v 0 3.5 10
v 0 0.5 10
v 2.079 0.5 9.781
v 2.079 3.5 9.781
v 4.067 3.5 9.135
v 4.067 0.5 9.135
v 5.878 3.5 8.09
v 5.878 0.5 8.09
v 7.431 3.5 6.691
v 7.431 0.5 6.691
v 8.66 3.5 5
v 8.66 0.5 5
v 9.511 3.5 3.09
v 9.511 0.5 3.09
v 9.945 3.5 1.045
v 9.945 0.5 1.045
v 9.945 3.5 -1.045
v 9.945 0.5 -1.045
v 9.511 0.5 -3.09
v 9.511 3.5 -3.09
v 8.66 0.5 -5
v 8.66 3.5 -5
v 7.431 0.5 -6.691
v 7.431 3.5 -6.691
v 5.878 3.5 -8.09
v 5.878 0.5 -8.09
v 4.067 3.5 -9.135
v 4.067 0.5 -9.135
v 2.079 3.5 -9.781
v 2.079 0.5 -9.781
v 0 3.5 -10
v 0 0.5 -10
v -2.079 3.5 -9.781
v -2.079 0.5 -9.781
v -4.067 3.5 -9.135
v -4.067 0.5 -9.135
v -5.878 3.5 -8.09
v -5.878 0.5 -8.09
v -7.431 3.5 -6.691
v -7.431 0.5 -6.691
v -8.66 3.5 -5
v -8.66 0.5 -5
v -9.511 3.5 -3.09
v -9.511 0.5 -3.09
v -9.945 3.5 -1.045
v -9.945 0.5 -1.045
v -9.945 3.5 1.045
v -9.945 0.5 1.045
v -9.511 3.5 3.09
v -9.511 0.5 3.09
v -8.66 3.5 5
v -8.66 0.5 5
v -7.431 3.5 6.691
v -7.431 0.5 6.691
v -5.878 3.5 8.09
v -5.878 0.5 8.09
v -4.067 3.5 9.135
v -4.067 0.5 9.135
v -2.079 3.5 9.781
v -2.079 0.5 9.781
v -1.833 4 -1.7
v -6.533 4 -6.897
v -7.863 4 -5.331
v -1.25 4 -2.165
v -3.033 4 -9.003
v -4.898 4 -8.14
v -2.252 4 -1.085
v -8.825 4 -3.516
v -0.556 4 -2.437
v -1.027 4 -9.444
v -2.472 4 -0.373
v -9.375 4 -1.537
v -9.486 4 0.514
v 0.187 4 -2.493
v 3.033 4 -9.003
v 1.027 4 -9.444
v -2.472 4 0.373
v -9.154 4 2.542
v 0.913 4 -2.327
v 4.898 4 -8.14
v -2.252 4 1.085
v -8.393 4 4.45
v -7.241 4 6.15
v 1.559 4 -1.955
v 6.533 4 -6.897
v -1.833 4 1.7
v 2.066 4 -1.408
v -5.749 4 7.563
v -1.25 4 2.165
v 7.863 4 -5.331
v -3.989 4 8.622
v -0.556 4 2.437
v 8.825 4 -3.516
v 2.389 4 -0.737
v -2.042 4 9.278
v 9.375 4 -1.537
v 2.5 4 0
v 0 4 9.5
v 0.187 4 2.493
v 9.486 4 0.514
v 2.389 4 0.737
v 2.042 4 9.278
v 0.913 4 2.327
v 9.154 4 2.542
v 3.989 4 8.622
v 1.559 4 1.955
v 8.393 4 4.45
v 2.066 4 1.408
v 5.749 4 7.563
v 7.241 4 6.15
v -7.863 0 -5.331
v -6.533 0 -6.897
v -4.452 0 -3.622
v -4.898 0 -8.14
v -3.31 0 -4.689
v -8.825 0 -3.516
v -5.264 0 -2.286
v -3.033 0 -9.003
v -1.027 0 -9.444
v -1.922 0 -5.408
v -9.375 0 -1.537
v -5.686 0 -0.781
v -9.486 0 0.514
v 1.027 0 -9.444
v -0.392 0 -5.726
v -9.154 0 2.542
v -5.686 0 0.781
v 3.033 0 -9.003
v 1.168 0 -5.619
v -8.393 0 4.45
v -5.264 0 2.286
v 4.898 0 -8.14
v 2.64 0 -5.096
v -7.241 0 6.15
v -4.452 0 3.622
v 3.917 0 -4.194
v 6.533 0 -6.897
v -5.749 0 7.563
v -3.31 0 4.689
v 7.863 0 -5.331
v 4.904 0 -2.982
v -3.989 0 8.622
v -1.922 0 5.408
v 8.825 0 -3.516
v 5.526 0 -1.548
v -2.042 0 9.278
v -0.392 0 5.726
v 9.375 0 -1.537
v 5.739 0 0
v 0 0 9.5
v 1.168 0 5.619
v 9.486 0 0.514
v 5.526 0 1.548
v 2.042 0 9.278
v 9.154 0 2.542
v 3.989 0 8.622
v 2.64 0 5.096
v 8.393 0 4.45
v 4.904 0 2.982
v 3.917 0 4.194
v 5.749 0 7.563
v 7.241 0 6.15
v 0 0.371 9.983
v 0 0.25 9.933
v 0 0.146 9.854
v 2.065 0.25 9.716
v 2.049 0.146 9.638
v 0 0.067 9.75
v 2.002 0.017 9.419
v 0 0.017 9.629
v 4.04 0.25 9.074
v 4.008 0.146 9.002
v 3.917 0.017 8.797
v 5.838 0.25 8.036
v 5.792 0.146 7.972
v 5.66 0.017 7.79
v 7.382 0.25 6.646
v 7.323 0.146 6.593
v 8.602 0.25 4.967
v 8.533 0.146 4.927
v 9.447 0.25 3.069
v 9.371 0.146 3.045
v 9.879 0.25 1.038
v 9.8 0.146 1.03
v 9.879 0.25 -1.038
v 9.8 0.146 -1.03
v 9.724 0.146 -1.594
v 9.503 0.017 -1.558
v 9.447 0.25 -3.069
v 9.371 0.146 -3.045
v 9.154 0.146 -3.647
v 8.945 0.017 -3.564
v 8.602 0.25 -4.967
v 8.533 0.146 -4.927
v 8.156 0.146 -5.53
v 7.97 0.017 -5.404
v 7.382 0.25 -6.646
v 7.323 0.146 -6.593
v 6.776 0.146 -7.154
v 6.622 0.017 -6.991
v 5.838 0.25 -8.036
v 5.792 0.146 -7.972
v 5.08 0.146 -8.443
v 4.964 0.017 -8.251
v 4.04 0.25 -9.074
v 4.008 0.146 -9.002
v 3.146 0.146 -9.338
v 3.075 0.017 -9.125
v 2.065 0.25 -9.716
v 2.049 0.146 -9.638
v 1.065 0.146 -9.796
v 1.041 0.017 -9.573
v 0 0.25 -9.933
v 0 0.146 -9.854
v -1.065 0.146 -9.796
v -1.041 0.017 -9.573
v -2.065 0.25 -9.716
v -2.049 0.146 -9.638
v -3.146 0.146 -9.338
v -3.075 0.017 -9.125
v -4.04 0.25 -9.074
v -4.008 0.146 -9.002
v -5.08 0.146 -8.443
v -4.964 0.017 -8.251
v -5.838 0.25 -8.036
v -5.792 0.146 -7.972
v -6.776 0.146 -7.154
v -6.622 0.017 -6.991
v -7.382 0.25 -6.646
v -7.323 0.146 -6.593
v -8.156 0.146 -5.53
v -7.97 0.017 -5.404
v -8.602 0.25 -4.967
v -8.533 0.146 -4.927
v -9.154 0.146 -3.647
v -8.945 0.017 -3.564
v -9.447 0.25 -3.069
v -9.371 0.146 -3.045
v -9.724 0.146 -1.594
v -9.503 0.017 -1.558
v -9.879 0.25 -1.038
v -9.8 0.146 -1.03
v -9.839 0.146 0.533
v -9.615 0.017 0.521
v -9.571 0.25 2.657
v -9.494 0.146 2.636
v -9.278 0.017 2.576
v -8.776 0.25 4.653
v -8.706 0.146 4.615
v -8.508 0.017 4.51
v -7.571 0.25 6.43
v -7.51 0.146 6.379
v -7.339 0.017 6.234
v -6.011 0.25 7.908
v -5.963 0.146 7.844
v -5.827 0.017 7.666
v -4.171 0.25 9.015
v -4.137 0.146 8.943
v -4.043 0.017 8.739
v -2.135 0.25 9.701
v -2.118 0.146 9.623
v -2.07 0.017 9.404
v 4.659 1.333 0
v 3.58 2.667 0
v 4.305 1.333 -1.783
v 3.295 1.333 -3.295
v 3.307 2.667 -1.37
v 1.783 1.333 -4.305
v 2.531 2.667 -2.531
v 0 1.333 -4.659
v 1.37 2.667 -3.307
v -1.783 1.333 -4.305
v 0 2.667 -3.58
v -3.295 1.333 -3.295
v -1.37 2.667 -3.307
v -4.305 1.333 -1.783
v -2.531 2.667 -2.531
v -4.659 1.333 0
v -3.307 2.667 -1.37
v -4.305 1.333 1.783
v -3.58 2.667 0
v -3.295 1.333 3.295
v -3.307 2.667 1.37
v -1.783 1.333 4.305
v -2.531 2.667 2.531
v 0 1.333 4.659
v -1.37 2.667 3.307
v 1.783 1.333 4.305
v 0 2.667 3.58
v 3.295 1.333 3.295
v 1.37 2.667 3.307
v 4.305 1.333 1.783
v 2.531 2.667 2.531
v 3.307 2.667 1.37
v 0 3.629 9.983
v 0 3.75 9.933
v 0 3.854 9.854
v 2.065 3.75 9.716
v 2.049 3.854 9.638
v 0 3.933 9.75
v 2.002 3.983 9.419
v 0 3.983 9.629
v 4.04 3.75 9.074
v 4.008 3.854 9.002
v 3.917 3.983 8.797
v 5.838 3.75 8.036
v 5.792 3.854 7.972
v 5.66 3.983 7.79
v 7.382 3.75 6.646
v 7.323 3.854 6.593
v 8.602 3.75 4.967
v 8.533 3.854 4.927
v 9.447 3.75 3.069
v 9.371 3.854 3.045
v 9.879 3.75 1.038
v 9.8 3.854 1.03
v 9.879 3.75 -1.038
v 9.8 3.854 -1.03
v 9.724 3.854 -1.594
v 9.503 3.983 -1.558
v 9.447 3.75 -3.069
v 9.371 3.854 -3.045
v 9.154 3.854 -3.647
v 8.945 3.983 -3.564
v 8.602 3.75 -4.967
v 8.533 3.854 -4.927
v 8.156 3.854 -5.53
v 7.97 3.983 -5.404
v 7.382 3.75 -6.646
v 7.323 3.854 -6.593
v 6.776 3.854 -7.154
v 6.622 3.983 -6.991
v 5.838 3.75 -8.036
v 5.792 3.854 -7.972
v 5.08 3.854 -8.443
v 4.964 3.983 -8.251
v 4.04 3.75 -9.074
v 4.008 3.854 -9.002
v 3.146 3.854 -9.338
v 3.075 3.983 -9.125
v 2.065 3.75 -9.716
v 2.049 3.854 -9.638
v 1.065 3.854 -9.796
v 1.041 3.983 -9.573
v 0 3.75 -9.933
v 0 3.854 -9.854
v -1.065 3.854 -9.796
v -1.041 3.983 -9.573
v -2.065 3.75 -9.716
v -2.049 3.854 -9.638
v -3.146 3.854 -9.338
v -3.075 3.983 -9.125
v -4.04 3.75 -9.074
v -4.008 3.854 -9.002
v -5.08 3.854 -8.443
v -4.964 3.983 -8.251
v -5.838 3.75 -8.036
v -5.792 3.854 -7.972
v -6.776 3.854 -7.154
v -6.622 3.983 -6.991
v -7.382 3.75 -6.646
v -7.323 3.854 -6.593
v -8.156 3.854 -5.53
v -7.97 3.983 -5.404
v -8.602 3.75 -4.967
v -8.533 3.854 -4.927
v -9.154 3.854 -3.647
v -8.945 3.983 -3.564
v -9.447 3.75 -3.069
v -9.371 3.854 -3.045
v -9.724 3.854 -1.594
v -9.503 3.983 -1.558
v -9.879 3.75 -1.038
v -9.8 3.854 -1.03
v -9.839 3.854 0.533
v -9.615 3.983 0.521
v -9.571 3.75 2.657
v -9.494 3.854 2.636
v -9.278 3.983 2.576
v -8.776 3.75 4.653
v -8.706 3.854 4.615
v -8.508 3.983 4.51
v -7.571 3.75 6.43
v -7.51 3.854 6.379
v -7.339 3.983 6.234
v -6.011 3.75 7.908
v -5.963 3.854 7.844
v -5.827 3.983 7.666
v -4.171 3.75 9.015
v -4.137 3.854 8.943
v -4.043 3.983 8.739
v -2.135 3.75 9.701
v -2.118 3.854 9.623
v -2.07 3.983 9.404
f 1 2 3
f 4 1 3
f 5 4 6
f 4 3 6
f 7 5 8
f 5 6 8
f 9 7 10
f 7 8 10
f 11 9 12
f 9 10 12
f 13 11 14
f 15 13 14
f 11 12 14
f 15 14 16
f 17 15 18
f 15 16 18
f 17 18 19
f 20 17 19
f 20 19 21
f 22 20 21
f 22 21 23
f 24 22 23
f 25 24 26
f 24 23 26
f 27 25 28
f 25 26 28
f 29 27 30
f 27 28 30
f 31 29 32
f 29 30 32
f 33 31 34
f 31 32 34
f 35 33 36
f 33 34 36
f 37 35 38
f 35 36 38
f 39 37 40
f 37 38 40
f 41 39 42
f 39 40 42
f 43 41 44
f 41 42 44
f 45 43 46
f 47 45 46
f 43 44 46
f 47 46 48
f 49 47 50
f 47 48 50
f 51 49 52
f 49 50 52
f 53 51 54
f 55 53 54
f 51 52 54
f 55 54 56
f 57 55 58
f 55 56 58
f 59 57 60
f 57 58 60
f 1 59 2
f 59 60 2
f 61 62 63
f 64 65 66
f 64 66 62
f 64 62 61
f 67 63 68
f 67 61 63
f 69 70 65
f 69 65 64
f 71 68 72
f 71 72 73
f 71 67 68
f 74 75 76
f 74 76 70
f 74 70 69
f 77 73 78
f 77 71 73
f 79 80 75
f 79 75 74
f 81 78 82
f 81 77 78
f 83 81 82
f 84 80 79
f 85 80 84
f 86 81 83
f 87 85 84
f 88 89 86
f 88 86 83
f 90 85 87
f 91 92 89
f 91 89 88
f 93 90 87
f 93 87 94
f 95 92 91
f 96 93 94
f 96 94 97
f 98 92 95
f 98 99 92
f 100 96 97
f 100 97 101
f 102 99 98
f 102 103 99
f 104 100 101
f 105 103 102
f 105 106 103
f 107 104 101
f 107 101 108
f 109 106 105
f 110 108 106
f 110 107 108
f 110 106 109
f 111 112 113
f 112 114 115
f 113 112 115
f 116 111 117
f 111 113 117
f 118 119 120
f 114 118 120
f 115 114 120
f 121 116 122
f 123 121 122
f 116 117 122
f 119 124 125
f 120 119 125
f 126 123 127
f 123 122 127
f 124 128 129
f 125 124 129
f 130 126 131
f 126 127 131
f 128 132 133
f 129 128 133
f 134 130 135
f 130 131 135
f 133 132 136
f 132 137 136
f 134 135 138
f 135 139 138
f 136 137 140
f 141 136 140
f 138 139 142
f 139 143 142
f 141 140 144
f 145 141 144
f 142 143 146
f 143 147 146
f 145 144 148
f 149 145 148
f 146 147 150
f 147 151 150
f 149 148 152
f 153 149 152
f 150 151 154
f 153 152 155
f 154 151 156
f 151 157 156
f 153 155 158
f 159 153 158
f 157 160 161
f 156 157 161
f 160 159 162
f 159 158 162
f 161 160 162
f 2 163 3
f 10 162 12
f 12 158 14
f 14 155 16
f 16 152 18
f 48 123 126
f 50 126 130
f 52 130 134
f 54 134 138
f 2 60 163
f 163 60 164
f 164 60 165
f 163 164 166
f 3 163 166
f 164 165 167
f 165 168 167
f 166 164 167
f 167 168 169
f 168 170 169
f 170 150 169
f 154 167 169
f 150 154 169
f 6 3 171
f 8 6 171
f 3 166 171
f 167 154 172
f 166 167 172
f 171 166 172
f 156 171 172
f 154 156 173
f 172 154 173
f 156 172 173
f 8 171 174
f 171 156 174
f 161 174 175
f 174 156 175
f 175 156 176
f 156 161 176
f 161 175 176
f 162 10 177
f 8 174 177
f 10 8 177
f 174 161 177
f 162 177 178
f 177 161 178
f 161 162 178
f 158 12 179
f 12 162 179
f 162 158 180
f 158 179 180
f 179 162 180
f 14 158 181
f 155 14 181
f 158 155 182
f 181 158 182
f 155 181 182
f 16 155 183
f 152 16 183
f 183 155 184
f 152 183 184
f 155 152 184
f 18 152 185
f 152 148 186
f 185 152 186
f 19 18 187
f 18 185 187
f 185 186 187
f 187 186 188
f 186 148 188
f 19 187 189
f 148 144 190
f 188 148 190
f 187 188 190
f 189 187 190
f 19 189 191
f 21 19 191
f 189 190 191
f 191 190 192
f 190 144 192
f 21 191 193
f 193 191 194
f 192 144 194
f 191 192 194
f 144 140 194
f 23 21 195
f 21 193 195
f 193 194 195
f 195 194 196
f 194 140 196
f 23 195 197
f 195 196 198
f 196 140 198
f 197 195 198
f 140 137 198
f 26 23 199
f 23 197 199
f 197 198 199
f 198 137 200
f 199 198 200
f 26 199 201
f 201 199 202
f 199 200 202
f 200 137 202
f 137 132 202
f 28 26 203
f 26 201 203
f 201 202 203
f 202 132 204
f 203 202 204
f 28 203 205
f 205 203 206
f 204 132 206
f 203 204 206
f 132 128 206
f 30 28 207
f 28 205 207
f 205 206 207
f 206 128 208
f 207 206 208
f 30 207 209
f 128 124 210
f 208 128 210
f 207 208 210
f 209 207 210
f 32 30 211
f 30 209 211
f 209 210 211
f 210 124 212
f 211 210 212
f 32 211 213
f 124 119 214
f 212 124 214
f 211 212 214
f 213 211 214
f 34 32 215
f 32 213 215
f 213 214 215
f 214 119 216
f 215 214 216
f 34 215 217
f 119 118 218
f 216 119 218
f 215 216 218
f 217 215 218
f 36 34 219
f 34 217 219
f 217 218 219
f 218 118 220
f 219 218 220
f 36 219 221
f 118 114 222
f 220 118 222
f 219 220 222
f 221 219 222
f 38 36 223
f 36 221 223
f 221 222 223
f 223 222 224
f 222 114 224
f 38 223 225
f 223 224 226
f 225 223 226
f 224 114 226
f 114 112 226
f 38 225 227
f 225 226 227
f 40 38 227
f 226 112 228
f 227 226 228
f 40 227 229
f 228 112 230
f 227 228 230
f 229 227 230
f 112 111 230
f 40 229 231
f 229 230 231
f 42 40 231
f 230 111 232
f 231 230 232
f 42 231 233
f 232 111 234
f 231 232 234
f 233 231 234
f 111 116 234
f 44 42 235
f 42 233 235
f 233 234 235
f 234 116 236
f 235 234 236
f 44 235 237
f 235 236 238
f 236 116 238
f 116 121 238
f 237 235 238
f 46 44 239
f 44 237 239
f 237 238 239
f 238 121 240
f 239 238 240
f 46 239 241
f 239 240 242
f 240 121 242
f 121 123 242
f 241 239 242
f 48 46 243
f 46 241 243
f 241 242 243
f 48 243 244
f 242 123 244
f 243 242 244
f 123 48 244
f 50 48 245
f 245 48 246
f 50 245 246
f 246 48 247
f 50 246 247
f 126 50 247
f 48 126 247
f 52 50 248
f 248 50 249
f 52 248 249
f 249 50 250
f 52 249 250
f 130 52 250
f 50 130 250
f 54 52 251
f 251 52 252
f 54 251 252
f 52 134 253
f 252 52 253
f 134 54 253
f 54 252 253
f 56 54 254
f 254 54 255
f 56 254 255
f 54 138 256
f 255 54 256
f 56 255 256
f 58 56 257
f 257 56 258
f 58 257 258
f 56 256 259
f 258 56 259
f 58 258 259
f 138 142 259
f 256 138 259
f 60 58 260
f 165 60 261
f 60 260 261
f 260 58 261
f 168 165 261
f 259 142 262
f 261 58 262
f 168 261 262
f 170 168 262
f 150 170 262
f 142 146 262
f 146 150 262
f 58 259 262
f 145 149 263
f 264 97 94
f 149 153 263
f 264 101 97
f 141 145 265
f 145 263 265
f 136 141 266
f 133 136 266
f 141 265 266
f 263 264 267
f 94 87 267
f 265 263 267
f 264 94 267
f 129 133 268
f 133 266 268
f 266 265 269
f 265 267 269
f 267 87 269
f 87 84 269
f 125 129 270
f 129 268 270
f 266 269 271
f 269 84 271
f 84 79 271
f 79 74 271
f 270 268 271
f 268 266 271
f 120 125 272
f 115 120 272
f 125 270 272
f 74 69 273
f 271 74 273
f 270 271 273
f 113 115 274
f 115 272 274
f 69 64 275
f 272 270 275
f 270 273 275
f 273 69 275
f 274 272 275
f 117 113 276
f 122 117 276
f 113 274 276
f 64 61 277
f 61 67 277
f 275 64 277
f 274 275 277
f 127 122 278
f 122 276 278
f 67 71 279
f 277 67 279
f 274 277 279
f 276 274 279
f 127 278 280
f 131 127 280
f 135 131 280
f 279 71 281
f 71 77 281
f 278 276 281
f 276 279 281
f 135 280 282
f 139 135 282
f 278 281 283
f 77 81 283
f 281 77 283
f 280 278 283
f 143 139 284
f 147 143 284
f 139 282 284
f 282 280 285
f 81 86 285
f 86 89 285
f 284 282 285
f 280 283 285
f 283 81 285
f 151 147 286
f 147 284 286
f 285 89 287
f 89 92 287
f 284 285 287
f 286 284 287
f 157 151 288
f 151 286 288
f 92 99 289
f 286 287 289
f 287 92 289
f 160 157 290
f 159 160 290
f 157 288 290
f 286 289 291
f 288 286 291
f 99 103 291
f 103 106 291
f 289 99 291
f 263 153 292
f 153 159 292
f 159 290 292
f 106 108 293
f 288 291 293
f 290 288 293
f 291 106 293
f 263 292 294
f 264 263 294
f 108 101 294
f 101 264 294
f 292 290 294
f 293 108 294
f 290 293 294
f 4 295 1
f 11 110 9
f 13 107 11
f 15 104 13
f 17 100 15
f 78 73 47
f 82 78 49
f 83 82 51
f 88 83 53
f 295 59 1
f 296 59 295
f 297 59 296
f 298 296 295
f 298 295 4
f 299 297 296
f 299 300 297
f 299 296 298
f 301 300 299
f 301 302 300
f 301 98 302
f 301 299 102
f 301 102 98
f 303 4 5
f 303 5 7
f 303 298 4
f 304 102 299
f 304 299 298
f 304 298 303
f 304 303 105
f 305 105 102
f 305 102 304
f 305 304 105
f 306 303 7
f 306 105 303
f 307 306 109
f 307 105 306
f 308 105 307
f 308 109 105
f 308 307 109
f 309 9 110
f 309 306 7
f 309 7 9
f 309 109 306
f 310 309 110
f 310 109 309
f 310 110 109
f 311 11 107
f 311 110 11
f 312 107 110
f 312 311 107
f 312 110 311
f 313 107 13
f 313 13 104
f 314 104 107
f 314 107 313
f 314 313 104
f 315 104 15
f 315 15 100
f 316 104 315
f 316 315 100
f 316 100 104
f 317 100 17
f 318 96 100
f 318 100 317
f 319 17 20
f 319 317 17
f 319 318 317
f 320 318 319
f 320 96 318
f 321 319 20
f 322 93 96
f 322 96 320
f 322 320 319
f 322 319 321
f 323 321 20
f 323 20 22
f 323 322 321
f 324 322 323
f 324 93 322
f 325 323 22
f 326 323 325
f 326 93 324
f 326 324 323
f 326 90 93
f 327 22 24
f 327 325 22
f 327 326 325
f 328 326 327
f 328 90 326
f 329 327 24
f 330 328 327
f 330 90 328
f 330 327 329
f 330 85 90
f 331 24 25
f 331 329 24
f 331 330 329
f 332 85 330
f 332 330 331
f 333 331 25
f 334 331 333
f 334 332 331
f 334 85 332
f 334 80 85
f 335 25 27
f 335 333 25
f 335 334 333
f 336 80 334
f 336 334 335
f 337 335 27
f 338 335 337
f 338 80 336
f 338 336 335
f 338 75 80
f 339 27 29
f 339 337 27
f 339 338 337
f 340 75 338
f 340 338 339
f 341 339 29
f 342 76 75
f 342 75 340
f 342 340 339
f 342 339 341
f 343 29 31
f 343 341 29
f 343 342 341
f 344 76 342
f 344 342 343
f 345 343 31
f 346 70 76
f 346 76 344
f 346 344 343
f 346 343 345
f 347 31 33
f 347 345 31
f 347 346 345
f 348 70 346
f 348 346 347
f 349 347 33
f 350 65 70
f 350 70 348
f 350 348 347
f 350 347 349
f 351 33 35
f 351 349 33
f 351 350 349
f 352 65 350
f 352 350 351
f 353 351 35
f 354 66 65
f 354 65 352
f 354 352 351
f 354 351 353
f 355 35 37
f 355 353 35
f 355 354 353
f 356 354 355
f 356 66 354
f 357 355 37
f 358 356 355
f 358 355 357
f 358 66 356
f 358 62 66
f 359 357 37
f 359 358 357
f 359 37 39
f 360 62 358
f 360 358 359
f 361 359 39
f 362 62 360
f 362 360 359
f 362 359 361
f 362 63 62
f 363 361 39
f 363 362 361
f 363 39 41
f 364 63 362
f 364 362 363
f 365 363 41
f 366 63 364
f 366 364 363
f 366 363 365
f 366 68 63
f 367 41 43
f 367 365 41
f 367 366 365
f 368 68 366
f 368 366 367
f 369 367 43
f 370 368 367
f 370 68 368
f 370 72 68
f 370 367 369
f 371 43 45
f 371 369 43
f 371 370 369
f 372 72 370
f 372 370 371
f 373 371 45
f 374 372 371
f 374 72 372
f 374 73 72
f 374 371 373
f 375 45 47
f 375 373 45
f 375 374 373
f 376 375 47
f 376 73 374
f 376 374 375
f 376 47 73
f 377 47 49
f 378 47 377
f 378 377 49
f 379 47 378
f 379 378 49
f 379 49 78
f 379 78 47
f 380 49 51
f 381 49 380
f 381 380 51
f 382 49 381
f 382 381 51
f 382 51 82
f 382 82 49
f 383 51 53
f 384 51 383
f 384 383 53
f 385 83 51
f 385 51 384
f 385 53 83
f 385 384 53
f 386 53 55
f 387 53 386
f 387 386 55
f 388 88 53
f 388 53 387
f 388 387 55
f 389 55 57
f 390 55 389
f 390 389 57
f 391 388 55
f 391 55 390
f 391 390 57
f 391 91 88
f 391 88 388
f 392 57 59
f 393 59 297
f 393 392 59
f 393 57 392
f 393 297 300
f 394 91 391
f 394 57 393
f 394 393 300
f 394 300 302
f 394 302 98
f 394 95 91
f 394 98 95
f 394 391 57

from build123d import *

# Parameters (mm, degrees)
SKETCH_1_R          = 10
EXTRUDE_1_DEPTH     = 4
SKETCH_2_R          = 2.5
CUT_EXTRUDE_1_DEPTH = 4
CUT_EXTRUDE_1_DRAFT = 39
FILLET_2_R          = 0.5
FILLET_3_R          = 0.5


with BuildPart() as part:
    # 草图1 → 凸台-拉伸1 (new body)
    with BuildSketch(Plane(origin=(0, 0, 0), x_dir=(1, 0, 0), z_dir=(0, 1, 0))):
        with Locations(Location((0, 0, 0), (0, 0, 270))):
            Circle(SKETCH_1_R)
    extrude(amount=EXTRUDE_1_DEPTH)


with BuildPart() as cut_extrude_1_tool:
    # 草图2 → 切除-拉伸1 (with draft: the straight prism first)
    with BuildSketch(Plane(origin=(0, 4, 0), x_dir=(1, 0, 0), z_dir=(0, 1, 0))):
        Circle(SKETCH_2_R)
    extrude(amount=-CUT_EXTRUDE_1_DEPTH)
    # 切除-拉伸1: the draft: its side faces are tilted about the plane it starts from
    cut_extrude_1_sides = [cut_extrude_1_tool.faces().sort_by_distance(p)[0] for p in [
        (-2.5, 2, 0),
    ]]
    draft(cut_extrude_1_sides, Plane(origin=(0, 4, 0), x_dir=(1, 0, 0), z_dir=(0, 1, 0)), CUT_EXTRUDE_1_DRAFT)


with BuildPart() as part_1:
    add(part.part)

    # 切除-拉伸1: cut by cut_extrude_1_tool
    add(cut_extrude_1_tool.part, mode=Mode.SUBTRACT)

    # 圆角2
    fillet_2_edges = [part_1.edges().sort_by_distance(p)[0] for p in [
        (0, 0, -10),
    ]]
    fillet(fillet_2_edges, radius=FILLET_2_R)

    # 圆角3
    fillet_3_edges = [part_1.edges().sort_by_distance(p)[0] for p in [
        (0, 4, -10),
    ]]
    fillet(fillet_3_edges, radius=FILLET_3_R)


solid = part_1.part
